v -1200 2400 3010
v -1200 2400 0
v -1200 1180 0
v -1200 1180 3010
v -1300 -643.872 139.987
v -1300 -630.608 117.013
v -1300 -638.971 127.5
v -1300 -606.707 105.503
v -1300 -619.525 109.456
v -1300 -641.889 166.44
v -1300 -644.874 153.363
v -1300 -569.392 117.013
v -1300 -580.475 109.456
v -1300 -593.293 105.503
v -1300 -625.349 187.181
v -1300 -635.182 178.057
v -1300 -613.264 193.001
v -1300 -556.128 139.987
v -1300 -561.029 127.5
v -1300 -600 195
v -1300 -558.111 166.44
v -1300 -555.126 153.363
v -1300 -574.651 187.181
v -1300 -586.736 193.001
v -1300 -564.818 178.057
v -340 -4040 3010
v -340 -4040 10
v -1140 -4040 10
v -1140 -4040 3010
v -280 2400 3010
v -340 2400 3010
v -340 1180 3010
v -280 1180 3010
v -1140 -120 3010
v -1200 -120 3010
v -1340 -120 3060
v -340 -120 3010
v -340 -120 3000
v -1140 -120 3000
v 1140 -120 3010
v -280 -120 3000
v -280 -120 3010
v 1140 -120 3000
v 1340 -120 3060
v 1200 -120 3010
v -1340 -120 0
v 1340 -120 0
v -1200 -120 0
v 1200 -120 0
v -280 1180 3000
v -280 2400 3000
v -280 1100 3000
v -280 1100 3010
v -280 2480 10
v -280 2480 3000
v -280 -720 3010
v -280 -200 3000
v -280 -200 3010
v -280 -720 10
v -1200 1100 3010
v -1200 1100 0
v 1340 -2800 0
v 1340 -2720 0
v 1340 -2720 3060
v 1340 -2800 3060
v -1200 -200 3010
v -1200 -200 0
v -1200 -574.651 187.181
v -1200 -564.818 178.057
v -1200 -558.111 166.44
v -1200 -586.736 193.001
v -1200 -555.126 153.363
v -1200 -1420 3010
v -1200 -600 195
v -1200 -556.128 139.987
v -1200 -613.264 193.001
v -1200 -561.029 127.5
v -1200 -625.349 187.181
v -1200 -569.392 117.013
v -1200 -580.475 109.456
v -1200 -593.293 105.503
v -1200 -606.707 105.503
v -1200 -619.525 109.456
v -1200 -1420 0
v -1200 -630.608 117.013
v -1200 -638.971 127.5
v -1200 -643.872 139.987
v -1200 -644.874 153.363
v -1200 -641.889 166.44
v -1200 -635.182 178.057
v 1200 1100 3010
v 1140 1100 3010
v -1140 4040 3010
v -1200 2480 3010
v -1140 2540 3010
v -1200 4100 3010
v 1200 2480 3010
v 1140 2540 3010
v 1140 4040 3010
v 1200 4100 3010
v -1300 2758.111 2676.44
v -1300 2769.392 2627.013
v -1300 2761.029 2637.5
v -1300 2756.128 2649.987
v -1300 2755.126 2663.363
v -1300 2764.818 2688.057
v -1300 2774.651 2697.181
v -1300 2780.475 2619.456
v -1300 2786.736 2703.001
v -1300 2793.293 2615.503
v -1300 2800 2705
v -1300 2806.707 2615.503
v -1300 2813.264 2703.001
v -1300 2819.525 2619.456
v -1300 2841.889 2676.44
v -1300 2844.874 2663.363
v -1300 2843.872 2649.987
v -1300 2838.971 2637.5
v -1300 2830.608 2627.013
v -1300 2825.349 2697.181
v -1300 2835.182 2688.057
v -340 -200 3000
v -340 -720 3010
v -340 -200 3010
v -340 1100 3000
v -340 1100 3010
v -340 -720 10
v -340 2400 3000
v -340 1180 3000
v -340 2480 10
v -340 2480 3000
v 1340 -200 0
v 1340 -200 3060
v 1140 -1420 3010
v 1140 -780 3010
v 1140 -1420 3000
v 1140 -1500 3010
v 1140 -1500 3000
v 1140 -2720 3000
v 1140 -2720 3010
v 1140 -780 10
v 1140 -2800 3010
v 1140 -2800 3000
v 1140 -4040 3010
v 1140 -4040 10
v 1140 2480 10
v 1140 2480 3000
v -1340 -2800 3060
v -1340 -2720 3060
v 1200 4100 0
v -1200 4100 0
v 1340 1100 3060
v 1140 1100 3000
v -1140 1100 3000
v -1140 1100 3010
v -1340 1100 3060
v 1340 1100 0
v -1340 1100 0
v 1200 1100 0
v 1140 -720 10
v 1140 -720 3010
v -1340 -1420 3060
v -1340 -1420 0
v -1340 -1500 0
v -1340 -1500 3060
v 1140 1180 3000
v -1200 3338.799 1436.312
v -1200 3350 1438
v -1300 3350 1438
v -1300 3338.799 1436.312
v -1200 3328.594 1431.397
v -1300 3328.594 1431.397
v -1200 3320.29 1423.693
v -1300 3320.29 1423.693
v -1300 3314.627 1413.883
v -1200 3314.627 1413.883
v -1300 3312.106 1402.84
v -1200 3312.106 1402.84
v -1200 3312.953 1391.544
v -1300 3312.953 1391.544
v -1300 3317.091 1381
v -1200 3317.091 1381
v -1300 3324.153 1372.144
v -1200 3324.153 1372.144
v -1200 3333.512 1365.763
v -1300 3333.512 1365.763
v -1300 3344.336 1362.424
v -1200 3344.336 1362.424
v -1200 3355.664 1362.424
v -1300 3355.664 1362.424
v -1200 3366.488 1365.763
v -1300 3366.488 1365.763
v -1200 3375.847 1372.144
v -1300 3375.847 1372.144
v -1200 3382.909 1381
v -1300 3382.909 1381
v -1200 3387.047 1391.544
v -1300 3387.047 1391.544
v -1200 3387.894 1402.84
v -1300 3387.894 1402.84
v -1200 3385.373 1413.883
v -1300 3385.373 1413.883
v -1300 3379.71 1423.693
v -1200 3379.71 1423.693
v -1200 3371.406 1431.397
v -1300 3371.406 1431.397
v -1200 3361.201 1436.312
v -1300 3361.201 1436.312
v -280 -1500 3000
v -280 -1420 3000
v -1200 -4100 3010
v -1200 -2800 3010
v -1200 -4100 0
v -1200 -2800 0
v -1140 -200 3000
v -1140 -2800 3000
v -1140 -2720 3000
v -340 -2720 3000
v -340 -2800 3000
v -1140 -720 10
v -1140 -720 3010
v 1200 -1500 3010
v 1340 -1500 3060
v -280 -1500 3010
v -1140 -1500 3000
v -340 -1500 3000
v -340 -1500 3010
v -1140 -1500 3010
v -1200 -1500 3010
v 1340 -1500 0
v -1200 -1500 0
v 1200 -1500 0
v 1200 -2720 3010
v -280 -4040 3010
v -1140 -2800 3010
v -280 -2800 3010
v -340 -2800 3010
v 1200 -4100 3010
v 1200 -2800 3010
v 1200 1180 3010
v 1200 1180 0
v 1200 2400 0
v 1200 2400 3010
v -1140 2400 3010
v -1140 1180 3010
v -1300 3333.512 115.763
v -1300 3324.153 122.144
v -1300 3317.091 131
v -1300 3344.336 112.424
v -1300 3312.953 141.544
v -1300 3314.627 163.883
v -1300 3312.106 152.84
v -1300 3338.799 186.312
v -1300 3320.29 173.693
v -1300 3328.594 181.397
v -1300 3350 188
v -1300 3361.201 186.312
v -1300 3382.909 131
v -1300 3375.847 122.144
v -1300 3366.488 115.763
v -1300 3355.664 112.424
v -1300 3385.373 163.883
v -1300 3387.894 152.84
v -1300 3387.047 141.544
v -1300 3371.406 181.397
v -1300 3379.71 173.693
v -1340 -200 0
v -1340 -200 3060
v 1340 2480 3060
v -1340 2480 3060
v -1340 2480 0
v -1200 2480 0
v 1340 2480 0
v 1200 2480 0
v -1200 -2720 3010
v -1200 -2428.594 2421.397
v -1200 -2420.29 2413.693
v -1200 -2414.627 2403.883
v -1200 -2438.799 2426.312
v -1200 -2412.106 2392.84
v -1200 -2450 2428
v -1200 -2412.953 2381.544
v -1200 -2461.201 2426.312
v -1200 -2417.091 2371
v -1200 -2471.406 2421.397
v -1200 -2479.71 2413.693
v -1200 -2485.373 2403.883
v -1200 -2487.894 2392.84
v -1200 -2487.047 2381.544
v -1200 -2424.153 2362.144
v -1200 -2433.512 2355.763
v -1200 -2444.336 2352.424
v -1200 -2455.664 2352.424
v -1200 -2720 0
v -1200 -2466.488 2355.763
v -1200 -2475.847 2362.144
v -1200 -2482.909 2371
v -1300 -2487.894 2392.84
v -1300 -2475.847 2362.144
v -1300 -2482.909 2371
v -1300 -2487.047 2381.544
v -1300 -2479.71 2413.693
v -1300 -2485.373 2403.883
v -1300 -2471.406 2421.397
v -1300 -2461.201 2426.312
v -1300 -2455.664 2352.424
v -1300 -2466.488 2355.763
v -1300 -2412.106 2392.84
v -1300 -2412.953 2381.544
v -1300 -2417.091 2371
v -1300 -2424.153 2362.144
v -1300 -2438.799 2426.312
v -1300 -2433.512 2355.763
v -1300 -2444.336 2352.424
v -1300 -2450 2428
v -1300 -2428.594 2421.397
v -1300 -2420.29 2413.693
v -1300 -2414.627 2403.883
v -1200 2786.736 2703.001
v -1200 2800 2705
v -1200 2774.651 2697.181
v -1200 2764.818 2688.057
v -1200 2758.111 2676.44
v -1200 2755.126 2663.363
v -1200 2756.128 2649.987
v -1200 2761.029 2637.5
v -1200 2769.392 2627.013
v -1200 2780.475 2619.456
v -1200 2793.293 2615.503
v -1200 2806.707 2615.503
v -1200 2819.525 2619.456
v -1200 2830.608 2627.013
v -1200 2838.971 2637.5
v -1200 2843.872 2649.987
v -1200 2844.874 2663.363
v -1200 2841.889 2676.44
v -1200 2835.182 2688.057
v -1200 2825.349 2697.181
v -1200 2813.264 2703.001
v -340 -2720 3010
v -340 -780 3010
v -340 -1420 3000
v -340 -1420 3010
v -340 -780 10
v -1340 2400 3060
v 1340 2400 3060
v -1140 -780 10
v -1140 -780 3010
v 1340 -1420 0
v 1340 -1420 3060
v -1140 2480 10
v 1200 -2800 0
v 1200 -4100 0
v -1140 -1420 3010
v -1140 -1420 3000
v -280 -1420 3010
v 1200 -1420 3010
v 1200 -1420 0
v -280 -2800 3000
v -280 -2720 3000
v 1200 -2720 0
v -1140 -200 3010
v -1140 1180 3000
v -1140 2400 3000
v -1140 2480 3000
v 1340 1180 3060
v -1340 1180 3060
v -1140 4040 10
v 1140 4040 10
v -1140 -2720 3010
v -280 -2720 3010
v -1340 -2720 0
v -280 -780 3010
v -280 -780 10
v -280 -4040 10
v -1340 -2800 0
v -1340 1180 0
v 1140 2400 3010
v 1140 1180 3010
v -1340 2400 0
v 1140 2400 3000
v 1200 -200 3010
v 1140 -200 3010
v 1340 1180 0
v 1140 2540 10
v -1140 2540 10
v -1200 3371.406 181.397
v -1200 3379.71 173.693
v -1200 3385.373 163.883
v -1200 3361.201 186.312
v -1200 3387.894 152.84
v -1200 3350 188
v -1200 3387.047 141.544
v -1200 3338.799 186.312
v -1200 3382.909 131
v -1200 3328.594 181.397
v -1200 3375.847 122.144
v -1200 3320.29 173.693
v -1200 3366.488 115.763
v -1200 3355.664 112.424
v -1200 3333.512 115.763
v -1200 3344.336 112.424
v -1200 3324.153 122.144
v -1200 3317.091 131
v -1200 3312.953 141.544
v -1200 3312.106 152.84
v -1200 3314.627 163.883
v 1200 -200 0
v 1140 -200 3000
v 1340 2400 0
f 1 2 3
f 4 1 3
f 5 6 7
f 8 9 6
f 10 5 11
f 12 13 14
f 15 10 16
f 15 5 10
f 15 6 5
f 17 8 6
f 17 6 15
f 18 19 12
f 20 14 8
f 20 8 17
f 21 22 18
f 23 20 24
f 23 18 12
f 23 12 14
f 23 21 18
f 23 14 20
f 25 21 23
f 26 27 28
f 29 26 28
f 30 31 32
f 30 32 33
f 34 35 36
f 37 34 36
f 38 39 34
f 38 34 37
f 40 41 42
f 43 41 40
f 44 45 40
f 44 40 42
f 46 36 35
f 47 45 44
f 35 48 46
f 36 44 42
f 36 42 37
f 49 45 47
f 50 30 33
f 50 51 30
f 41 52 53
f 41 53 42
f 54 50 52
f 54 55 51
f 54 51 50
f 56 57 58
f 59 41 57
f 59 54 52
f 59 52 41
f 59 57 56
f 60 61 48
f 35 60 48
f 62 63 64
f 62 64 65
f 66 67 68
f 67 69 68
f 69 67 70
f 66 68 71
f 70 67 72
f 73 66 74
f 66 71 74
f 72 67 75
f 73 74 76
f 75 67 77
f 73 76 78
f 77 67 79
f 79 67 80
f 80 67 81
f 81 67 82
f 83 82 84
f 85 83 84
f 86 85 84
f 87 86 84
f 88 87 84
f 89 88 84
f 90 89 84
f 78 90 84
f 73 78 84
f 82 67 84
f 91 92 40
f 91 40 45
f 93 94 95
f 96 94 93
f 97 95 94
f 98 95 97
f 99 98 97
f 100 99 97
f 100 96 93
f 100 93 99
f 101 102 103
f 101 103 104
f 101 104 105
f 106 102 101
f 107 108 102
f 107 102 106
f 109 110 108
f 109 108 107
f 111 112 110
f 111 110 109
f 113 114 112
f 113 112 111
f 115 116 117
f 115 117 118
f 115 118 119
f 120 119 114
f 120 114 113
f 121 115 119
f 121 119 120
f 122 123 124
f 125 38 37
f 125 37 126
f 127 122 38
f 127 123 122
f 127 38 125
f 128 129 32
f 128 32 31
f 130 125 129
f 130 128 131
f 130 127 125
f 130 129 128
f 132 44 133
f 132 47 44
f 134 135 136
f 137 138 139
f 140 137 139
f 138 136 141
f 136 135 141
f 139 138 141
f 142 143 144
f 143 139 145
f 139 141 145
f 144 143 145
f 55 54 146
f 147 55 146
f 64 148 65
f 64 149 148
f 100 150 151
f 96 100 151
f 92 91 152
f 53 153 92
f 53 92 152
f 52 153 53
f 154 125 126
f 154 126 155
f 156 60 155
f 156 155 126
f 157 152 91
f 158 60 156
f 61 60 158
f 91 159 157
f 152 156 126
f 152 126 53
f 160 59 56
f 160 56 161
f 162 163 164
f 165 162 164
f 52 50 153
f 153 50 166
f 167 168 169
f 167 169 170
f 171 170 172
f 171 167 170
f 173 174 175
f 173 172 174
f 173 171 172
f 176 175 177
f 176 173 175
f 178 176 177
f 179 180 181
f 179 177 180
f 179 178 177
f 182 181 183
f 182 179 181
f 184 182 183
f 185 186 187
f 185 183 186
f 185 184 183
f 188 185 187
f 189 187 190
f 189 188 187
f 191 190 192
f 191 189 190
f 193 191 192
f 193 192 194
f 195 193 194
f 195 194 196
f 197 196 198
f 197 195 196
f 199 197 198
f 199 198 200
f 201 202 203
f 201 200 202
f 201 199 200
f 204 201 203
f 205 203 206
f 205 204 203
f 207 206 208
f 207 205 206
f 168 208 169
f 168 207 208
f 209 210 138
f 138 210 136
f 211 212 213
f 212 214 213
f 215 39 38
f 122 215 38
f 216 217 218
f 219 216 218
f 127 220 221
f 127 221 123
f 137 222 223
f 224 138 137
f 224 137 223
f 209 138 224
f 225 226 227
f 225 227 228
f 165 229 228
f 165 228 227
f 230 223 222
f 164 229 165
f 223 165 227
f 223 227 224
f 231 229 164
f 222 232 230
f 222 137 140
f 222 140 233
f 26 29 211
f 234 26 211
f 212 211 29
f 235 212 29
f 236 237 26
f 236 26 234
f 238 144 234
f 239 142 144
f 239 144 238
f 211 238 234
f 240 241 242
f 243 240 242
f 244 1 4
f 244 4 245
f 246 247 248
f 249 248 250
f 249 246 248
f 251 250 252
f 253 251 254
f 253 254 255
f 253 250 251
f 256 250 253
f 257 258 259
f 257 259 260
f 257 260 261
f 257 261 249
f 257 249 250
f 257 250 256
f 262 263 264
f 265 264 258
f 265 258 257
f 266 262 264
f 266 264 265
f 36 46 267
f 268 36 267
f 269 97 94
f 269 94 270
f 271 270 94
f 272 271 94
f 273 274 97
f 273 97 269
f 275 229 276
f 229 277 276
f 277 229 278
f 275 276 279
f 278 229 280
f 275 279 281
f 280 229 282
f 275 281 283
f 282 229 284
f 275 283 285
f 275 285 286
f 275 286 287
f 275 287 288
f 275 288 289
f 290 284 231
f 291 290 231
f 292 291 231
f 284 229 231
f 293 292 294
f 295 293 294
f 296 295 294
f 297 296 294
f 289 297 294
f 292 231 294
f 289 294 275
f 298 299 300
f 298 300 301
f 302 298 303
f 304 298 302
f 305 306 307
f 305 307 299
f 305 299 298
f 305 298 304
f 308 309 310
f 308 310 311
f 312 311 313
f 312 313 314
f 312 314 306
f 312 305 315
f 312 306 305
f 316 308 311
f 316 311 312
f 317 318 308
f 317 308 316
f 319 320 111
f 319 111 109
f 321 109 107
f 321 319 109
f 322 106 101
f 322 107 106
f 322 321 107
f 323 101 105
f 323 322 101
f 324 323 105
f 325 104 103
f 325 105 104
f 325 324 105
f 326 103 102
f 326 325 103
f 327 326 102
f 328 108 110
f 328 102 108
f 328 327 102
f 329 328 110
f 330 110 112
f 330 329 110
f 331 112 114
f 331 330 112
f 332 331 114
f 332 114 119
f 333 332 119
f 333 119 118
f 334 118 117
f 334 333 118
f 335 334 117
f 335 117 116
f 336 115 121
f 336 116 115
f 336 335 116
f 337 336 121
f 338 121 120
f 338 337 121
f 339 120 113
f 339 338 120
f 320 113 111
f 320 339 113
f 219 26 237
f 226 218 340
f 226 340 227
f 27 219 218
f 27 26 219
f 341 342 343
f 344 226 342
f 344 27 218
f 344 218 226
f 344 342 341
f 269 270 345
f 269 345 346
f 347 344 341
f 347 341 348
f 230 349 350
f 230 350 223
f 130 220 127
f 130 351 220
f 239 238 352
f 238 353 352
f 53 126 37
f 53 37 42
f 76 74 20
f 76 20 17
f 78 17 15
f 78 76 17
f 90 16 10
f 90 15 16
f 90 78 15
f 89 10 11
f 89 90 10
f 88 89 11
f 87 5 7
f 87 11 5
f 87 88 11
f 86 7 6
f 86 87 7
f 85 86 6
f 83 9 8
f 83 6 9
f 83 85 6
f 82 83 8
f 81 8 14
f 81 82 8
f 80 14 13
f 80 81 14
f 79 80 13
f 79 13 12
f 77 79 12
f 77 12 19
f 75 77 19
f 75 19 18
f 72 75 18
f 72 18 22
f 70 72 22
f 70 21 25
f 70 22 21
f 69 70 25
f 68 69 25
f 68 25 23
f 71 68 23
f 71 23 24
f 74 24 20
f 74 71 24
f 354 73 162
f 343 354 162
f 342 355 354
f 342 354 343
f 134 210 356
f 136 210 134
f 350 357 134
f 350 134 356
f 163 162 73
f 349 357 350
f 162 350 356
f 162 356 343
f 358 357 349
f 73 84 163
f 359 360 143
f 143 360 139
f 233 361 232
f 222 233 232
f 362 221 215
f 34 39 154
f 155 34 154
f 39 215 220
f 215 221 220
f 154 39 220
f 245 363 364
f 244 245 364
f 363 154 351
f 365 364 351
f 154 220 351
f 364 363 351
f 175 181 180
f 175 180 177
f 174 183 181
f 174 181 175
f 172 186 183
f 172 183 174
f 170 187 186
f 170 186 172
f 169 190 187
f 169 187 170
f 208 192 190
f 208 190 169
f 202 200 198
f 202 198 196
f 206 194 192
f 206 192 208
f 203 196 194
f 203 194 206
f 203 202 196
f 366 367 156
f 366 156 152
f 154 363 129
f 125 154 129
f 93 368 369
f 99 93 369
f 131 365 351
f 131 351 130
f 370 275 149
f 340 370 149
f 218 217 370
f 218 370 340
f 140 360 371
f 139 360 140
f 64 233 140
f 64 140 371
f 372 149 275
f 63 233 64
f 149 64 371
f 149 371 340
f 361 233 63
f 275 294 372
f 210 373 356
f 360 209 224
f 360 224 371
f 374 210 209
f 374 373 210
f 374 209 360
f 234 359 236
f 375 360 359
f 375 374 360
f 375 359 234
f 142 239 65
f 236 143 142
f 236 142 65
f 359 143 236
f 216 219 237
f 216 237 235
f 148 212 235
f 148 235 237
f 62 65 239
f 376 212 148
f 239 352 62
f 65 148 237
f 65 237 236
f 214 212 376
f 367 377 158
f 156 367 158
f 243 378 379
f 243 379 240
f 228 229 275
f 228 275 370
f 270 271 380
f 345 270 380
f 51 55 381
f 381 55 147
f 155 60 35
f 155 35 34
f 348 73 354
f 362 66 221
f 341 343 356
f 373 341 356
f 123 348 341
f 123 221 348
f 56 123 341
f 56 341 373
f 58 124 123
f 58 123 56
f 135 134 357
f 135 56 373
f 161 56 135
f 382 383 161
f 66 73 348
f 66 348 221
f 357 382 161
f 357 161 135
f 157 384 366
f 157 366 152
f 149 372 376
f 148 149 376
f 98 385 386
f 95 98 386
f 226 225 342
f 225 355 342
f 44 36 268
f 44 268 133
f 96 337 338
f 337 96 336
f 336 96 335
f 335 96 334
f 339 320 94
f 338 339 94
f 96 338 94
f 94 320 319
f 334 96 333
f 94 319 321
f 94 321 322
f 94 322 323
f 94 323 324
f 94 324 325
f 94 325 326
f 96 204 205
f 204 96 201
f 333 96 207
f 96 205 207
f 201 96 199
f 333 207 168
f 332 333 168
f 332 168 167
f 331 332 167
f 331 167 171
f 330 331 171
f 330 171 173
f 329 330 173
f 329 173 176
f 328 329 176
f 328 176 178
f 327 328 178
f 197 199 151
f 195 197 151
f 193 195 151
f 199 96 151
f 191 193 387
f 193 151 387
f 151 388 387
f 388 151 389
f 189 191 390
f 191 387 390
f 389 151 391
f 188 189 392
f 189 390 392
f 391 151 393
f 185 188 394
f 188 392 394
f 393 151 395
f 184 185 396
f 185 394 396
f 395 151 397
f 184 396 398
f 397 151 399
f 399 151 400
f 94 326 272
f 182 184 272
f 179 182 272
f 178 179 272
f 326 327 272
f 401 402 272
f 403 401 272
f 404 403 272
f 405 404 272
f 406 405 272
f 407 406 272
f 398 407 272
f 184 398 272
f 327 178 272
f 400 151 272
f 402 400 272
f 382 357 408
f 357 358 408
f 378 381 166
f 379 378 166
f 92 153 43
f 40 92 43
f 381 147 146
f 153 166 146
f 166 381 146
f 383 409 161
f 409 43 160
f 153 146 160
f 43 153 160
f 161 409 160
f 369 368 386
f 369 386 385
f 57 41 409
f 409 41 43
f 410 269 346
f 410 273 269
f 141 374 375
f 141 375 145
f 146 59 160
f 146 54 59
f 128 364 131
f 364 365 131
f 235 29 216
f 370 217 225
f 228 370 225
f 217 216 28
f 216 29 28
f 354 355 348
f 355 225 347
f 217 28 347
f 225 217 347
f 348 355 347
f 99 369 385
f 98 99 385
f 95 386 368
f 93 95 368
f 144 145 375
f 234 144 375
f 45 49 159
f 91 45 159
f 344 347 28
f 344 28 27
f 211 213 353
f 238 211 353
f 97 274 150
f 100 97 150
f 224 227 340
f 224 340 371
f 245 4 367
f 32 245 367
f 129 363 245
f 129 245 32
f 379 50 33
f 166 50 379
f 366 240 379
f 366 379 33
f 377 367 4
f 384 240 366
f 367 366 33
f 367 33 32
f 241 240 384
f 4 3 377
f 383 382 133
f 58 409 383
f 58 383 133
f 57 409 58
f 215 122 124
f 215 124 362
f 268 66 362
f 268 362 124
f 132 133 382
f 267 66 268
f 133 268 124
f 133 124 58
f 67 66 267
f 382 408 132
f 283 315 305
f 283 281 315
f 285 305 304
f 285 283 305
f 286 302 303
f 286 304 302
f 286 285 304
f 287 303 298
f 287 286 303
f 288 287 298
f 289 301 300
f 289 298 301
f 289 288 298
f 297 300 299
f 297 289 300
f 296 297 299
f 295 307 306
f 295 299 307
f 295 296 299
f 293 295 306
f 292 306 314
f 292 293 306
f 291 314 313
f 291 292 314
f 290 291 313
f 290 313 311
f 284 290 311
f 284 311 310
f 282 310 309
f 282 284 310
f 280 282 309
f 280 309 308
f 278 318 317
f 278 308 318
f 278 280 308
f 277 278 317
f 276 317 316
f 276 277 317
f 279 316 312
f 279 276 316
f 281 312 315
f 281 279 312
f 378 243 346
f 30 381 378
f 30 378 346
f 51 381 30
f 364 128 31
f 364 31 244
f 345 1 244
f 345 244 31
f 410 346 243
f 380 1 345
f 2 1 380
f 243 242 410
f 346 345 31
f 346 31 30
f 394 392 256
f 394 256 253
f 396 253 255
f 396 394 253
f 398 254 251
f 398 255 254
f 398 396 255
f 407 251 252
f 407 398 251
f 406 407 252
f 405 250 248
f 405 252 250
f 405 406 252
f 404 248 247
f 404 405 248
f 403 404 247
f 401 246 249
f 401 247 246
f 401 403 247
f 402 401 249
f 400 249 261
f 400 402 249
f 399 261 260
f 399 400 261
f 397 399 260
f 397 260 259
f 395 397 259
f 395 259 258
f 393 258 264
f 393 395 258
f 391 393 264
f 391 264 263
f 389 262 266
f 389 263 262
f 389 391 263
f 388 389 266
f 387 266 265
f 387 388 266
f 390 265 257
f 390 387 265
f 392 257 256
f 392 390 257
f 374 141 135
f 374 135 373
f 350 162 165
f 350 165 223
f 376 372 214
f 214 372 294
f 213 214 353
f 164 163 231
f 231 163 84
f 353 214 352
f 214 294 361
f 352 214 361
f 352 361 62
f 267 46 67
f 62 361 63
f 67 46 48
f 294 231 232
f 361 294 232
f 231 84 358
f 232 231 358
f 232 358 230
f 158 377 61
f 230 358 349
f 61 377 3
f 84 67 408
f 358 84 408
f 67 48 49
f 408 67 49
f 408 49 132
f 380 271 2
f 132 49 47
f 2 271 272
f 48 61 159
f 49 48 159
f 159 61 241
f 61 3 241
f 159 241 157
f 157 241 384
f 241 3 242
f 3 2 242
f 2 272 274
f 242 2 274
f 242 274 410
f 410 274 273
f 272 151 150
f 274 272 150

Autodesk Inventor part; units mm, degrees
ref_plane "YZ Plane" through (0, 0, 0) normal (1, 0, 0) x (0, 1, 0)
ref_plane "XZ Plane" through (0, 0, 0) normal (0, 1, 0) x (-1, 0, 0)
ref_plane "XY Plane" through (0, 0, 0) normal (0, 0, 1) x (1, 0, 0)
sketch "Sketch1" plane through (0, 0, 0) normal (0, 0, 1) x (1, 0, 0)
  line L0 (1200, 4100) -> (-1200, 4100)
  line L1 (-1200, 4100) -> (-1200, -4100)
  line L2 (-1200, -4100) -> (1200, -4100)
  line L3 (1200, -4100) -> (1200, 4100)
  line L4 (1200, 4100) -> (-1200, -4100) construction
  line L5 (-1200, 4100) -> (1200, -4100) construction
  point P0 (0, 0)
  dimension "d0" = 2400
  dimension "d1" = 8200
extrude "Extrusion1" add sketch "Sketch1" along normal blind 10
sketch "Sketch2" plane through (0, 0, 10) normal (0, 0, 1) x (1, 0, 0)
  line L0 (-1200, 4100) -> (-1200, -4100) projected
  line L1 (-1200, -4100) -> (1200, -4100) projected
  line L2 (1200, -4100) -> (1200, 4100) projected
  line L3 (1200, 4100) -> (-1200, 4100) projected
  line L4 (1140, 4040) -> (1140, -4040)
  line L5 (1140, -4040) -> (-1140, -4040)
  line L6 (-1140, -4040) -> (-1140, 4040)
  line L7 (-1140, 4040) -> (1140, 4040)
  line L8 (1140, 2540) -> (-1140, 2540)
  line L9 (-1140, 2540) -> (-1140, 2480)
  line L10 (-1140, 2480) -> (1140, 2480)
  line L11 (1140, 2480) -> (1140, 2540)
  line L12 (-280, -4040) -> (-340, -4040)
  line L13 (-340, -4040) -> (-340, 2480)
  line L14 (-340, 2480) -> (-280, 2480)
  line L15 (-280, 2480) -> (-280, -4040)
  line L16 (-1140, -720) -> (1140, -720)
  line L17 (1140, -720) -> (1140, -780)
  line L18 (1140, -780) -> (-1140, -780)
  line L19 (-1140, -780) -> (-1140, -720)
  point P0 (0, 0)
  point P1 (-280, -720)
  point P2 (-340, -780)
  point P3 (-1140, -780)
  point P4 (-280, -780)
  point P5 (-340, -720)
  dimension "d4" = 60
  dimension "d5" = 60
  dimension "d6" = 1500
  dimension "d7" = 800
  dimension "d8" = 3200
extrude "Extrusion2" add sketch "Sketch2" along normal blind 3000 contours L3 L2 L1 L0 | L4 L10 L6 L8 | L4 L18 L15 L16 | L15 L16 L13 L10 | L15 L18 L13 L16 | L16 L13 L18 L6 | L15 L5 L13 L18
sketch "Sketch5" plane through (-1200, 4100, 0) normal (-1, 0, 0) x (0, 0, 1)
  line L0 (0, 0) -> (0, -8200) projected
  line L1 (0, -8200) -> (3010, -8200) projected
  line L2 (3010, 0) -> (3010, -8200) construction
  line L3 (0, 0) -> (3010, 0) construction
  circle A0 centre (150, -750) radius 38
  circle A1 centre (2660, -1300) radius 45
  circle A2 centre (2390, -6550) radius 38
  circle A3 centre (1400, -750) radius 38
  circle A4 centre (150, -4700) radius 45
  point P0 (0, -4100)
  dimension "d21" = 76
  dimension "d23" = 1300
  dimension "d24" = 350
  dimension "d25" = 90
  dimension "d26" = 150
  dimension "d27" = 1400
  dimension "d28" = 750
  dimension "d29" = 90
  dimension "d30" = 3500
  dimension "d31" = 620
  dimension "d32" = 1650
sketch "Sketch3" plane through (0, 0, 0) normal (0, 0, 1) x (1, 0, 0)
  line L0 (-1200, 4100) -> (-1200, -4100) construction
  line L1 (1200, 4100) -> (-1200, 4100) construction
  line L2 (1200, -4100) -> (1200, 4100) construction
  line L3 (-1200, -4100) -> (1200, -4100) construction
  line L4 (-1200, 2480) -> (-1340, 2480)
  line L5 (-1340, 2480) -> (-1340, 2400)
  line L6 (-1340, 2400) -> (-1200, 2400)
  line L7 (-1200, 2400) -> (-1200, 2480)
  line L8 (1200, 2480) -> (1340, 2480)
  line L9 (1340, 2480) -> (1340, 2400)
  line L10 (1340, 2400) -> (1200, 2400)
  line L11 (1200, 2400) -> (1200, 2480)
  point P0 (0, 0)
  dimension "d11" = 140
  dimension "d12" = 80
  dimension "d13" = 1620
extrude "Extrusion3" add sketch "Sketch3" along normal blind 3000
sketch "Sketch4" plane through (0, 0, 3000) normal (0, 0, 1) x (1, 0, 0)
  line L0 (1200, 2400) -> (1340, 2400) projected
  line L1 (1340, 2400) -> (1340, 2480) projected
  line L2 (1340, 2480) -> (1200, 2480) projected
  line L3 (1200, 2400) -> (1200, 2480) projected
  line L4 (-1340, 2480) -> (-1340, 2400) projected
  line L5 (-1340, 2400) -> (-1200, 2400) projected
  line L6 (-1200, 2480) -> (-1200, 2400) projected
  line L7 (-1200, 2480) -> (-1340, 2480) projected
  line L8 (-1200, 2480) -> (-1340, 2480) projected
  line L9 (1200, 2480) -> (-1200, 2480)
  line L10 (-1200, 2400) -> (1200, 2400)
  line L11 (1200, -4100) -> (1200, 4100) projected
  line L12 (1200, 2480) -> (-1200, 2480)
  point P0 (0, 0)
extrude "Extrusion4" add sketch "Sketch4" along normal blind 60
pattern_linear "Rectangular Pattern1" count 5 spacing 1300 along (0, -1, 0) of "Extrusion3", "Extrusion4"
extrude "Extrusion5" add sketch "Sketch5" along normal blind 100
equation "\"d5\" = d4"
properties part number "BSH 600 Tank dummy"
